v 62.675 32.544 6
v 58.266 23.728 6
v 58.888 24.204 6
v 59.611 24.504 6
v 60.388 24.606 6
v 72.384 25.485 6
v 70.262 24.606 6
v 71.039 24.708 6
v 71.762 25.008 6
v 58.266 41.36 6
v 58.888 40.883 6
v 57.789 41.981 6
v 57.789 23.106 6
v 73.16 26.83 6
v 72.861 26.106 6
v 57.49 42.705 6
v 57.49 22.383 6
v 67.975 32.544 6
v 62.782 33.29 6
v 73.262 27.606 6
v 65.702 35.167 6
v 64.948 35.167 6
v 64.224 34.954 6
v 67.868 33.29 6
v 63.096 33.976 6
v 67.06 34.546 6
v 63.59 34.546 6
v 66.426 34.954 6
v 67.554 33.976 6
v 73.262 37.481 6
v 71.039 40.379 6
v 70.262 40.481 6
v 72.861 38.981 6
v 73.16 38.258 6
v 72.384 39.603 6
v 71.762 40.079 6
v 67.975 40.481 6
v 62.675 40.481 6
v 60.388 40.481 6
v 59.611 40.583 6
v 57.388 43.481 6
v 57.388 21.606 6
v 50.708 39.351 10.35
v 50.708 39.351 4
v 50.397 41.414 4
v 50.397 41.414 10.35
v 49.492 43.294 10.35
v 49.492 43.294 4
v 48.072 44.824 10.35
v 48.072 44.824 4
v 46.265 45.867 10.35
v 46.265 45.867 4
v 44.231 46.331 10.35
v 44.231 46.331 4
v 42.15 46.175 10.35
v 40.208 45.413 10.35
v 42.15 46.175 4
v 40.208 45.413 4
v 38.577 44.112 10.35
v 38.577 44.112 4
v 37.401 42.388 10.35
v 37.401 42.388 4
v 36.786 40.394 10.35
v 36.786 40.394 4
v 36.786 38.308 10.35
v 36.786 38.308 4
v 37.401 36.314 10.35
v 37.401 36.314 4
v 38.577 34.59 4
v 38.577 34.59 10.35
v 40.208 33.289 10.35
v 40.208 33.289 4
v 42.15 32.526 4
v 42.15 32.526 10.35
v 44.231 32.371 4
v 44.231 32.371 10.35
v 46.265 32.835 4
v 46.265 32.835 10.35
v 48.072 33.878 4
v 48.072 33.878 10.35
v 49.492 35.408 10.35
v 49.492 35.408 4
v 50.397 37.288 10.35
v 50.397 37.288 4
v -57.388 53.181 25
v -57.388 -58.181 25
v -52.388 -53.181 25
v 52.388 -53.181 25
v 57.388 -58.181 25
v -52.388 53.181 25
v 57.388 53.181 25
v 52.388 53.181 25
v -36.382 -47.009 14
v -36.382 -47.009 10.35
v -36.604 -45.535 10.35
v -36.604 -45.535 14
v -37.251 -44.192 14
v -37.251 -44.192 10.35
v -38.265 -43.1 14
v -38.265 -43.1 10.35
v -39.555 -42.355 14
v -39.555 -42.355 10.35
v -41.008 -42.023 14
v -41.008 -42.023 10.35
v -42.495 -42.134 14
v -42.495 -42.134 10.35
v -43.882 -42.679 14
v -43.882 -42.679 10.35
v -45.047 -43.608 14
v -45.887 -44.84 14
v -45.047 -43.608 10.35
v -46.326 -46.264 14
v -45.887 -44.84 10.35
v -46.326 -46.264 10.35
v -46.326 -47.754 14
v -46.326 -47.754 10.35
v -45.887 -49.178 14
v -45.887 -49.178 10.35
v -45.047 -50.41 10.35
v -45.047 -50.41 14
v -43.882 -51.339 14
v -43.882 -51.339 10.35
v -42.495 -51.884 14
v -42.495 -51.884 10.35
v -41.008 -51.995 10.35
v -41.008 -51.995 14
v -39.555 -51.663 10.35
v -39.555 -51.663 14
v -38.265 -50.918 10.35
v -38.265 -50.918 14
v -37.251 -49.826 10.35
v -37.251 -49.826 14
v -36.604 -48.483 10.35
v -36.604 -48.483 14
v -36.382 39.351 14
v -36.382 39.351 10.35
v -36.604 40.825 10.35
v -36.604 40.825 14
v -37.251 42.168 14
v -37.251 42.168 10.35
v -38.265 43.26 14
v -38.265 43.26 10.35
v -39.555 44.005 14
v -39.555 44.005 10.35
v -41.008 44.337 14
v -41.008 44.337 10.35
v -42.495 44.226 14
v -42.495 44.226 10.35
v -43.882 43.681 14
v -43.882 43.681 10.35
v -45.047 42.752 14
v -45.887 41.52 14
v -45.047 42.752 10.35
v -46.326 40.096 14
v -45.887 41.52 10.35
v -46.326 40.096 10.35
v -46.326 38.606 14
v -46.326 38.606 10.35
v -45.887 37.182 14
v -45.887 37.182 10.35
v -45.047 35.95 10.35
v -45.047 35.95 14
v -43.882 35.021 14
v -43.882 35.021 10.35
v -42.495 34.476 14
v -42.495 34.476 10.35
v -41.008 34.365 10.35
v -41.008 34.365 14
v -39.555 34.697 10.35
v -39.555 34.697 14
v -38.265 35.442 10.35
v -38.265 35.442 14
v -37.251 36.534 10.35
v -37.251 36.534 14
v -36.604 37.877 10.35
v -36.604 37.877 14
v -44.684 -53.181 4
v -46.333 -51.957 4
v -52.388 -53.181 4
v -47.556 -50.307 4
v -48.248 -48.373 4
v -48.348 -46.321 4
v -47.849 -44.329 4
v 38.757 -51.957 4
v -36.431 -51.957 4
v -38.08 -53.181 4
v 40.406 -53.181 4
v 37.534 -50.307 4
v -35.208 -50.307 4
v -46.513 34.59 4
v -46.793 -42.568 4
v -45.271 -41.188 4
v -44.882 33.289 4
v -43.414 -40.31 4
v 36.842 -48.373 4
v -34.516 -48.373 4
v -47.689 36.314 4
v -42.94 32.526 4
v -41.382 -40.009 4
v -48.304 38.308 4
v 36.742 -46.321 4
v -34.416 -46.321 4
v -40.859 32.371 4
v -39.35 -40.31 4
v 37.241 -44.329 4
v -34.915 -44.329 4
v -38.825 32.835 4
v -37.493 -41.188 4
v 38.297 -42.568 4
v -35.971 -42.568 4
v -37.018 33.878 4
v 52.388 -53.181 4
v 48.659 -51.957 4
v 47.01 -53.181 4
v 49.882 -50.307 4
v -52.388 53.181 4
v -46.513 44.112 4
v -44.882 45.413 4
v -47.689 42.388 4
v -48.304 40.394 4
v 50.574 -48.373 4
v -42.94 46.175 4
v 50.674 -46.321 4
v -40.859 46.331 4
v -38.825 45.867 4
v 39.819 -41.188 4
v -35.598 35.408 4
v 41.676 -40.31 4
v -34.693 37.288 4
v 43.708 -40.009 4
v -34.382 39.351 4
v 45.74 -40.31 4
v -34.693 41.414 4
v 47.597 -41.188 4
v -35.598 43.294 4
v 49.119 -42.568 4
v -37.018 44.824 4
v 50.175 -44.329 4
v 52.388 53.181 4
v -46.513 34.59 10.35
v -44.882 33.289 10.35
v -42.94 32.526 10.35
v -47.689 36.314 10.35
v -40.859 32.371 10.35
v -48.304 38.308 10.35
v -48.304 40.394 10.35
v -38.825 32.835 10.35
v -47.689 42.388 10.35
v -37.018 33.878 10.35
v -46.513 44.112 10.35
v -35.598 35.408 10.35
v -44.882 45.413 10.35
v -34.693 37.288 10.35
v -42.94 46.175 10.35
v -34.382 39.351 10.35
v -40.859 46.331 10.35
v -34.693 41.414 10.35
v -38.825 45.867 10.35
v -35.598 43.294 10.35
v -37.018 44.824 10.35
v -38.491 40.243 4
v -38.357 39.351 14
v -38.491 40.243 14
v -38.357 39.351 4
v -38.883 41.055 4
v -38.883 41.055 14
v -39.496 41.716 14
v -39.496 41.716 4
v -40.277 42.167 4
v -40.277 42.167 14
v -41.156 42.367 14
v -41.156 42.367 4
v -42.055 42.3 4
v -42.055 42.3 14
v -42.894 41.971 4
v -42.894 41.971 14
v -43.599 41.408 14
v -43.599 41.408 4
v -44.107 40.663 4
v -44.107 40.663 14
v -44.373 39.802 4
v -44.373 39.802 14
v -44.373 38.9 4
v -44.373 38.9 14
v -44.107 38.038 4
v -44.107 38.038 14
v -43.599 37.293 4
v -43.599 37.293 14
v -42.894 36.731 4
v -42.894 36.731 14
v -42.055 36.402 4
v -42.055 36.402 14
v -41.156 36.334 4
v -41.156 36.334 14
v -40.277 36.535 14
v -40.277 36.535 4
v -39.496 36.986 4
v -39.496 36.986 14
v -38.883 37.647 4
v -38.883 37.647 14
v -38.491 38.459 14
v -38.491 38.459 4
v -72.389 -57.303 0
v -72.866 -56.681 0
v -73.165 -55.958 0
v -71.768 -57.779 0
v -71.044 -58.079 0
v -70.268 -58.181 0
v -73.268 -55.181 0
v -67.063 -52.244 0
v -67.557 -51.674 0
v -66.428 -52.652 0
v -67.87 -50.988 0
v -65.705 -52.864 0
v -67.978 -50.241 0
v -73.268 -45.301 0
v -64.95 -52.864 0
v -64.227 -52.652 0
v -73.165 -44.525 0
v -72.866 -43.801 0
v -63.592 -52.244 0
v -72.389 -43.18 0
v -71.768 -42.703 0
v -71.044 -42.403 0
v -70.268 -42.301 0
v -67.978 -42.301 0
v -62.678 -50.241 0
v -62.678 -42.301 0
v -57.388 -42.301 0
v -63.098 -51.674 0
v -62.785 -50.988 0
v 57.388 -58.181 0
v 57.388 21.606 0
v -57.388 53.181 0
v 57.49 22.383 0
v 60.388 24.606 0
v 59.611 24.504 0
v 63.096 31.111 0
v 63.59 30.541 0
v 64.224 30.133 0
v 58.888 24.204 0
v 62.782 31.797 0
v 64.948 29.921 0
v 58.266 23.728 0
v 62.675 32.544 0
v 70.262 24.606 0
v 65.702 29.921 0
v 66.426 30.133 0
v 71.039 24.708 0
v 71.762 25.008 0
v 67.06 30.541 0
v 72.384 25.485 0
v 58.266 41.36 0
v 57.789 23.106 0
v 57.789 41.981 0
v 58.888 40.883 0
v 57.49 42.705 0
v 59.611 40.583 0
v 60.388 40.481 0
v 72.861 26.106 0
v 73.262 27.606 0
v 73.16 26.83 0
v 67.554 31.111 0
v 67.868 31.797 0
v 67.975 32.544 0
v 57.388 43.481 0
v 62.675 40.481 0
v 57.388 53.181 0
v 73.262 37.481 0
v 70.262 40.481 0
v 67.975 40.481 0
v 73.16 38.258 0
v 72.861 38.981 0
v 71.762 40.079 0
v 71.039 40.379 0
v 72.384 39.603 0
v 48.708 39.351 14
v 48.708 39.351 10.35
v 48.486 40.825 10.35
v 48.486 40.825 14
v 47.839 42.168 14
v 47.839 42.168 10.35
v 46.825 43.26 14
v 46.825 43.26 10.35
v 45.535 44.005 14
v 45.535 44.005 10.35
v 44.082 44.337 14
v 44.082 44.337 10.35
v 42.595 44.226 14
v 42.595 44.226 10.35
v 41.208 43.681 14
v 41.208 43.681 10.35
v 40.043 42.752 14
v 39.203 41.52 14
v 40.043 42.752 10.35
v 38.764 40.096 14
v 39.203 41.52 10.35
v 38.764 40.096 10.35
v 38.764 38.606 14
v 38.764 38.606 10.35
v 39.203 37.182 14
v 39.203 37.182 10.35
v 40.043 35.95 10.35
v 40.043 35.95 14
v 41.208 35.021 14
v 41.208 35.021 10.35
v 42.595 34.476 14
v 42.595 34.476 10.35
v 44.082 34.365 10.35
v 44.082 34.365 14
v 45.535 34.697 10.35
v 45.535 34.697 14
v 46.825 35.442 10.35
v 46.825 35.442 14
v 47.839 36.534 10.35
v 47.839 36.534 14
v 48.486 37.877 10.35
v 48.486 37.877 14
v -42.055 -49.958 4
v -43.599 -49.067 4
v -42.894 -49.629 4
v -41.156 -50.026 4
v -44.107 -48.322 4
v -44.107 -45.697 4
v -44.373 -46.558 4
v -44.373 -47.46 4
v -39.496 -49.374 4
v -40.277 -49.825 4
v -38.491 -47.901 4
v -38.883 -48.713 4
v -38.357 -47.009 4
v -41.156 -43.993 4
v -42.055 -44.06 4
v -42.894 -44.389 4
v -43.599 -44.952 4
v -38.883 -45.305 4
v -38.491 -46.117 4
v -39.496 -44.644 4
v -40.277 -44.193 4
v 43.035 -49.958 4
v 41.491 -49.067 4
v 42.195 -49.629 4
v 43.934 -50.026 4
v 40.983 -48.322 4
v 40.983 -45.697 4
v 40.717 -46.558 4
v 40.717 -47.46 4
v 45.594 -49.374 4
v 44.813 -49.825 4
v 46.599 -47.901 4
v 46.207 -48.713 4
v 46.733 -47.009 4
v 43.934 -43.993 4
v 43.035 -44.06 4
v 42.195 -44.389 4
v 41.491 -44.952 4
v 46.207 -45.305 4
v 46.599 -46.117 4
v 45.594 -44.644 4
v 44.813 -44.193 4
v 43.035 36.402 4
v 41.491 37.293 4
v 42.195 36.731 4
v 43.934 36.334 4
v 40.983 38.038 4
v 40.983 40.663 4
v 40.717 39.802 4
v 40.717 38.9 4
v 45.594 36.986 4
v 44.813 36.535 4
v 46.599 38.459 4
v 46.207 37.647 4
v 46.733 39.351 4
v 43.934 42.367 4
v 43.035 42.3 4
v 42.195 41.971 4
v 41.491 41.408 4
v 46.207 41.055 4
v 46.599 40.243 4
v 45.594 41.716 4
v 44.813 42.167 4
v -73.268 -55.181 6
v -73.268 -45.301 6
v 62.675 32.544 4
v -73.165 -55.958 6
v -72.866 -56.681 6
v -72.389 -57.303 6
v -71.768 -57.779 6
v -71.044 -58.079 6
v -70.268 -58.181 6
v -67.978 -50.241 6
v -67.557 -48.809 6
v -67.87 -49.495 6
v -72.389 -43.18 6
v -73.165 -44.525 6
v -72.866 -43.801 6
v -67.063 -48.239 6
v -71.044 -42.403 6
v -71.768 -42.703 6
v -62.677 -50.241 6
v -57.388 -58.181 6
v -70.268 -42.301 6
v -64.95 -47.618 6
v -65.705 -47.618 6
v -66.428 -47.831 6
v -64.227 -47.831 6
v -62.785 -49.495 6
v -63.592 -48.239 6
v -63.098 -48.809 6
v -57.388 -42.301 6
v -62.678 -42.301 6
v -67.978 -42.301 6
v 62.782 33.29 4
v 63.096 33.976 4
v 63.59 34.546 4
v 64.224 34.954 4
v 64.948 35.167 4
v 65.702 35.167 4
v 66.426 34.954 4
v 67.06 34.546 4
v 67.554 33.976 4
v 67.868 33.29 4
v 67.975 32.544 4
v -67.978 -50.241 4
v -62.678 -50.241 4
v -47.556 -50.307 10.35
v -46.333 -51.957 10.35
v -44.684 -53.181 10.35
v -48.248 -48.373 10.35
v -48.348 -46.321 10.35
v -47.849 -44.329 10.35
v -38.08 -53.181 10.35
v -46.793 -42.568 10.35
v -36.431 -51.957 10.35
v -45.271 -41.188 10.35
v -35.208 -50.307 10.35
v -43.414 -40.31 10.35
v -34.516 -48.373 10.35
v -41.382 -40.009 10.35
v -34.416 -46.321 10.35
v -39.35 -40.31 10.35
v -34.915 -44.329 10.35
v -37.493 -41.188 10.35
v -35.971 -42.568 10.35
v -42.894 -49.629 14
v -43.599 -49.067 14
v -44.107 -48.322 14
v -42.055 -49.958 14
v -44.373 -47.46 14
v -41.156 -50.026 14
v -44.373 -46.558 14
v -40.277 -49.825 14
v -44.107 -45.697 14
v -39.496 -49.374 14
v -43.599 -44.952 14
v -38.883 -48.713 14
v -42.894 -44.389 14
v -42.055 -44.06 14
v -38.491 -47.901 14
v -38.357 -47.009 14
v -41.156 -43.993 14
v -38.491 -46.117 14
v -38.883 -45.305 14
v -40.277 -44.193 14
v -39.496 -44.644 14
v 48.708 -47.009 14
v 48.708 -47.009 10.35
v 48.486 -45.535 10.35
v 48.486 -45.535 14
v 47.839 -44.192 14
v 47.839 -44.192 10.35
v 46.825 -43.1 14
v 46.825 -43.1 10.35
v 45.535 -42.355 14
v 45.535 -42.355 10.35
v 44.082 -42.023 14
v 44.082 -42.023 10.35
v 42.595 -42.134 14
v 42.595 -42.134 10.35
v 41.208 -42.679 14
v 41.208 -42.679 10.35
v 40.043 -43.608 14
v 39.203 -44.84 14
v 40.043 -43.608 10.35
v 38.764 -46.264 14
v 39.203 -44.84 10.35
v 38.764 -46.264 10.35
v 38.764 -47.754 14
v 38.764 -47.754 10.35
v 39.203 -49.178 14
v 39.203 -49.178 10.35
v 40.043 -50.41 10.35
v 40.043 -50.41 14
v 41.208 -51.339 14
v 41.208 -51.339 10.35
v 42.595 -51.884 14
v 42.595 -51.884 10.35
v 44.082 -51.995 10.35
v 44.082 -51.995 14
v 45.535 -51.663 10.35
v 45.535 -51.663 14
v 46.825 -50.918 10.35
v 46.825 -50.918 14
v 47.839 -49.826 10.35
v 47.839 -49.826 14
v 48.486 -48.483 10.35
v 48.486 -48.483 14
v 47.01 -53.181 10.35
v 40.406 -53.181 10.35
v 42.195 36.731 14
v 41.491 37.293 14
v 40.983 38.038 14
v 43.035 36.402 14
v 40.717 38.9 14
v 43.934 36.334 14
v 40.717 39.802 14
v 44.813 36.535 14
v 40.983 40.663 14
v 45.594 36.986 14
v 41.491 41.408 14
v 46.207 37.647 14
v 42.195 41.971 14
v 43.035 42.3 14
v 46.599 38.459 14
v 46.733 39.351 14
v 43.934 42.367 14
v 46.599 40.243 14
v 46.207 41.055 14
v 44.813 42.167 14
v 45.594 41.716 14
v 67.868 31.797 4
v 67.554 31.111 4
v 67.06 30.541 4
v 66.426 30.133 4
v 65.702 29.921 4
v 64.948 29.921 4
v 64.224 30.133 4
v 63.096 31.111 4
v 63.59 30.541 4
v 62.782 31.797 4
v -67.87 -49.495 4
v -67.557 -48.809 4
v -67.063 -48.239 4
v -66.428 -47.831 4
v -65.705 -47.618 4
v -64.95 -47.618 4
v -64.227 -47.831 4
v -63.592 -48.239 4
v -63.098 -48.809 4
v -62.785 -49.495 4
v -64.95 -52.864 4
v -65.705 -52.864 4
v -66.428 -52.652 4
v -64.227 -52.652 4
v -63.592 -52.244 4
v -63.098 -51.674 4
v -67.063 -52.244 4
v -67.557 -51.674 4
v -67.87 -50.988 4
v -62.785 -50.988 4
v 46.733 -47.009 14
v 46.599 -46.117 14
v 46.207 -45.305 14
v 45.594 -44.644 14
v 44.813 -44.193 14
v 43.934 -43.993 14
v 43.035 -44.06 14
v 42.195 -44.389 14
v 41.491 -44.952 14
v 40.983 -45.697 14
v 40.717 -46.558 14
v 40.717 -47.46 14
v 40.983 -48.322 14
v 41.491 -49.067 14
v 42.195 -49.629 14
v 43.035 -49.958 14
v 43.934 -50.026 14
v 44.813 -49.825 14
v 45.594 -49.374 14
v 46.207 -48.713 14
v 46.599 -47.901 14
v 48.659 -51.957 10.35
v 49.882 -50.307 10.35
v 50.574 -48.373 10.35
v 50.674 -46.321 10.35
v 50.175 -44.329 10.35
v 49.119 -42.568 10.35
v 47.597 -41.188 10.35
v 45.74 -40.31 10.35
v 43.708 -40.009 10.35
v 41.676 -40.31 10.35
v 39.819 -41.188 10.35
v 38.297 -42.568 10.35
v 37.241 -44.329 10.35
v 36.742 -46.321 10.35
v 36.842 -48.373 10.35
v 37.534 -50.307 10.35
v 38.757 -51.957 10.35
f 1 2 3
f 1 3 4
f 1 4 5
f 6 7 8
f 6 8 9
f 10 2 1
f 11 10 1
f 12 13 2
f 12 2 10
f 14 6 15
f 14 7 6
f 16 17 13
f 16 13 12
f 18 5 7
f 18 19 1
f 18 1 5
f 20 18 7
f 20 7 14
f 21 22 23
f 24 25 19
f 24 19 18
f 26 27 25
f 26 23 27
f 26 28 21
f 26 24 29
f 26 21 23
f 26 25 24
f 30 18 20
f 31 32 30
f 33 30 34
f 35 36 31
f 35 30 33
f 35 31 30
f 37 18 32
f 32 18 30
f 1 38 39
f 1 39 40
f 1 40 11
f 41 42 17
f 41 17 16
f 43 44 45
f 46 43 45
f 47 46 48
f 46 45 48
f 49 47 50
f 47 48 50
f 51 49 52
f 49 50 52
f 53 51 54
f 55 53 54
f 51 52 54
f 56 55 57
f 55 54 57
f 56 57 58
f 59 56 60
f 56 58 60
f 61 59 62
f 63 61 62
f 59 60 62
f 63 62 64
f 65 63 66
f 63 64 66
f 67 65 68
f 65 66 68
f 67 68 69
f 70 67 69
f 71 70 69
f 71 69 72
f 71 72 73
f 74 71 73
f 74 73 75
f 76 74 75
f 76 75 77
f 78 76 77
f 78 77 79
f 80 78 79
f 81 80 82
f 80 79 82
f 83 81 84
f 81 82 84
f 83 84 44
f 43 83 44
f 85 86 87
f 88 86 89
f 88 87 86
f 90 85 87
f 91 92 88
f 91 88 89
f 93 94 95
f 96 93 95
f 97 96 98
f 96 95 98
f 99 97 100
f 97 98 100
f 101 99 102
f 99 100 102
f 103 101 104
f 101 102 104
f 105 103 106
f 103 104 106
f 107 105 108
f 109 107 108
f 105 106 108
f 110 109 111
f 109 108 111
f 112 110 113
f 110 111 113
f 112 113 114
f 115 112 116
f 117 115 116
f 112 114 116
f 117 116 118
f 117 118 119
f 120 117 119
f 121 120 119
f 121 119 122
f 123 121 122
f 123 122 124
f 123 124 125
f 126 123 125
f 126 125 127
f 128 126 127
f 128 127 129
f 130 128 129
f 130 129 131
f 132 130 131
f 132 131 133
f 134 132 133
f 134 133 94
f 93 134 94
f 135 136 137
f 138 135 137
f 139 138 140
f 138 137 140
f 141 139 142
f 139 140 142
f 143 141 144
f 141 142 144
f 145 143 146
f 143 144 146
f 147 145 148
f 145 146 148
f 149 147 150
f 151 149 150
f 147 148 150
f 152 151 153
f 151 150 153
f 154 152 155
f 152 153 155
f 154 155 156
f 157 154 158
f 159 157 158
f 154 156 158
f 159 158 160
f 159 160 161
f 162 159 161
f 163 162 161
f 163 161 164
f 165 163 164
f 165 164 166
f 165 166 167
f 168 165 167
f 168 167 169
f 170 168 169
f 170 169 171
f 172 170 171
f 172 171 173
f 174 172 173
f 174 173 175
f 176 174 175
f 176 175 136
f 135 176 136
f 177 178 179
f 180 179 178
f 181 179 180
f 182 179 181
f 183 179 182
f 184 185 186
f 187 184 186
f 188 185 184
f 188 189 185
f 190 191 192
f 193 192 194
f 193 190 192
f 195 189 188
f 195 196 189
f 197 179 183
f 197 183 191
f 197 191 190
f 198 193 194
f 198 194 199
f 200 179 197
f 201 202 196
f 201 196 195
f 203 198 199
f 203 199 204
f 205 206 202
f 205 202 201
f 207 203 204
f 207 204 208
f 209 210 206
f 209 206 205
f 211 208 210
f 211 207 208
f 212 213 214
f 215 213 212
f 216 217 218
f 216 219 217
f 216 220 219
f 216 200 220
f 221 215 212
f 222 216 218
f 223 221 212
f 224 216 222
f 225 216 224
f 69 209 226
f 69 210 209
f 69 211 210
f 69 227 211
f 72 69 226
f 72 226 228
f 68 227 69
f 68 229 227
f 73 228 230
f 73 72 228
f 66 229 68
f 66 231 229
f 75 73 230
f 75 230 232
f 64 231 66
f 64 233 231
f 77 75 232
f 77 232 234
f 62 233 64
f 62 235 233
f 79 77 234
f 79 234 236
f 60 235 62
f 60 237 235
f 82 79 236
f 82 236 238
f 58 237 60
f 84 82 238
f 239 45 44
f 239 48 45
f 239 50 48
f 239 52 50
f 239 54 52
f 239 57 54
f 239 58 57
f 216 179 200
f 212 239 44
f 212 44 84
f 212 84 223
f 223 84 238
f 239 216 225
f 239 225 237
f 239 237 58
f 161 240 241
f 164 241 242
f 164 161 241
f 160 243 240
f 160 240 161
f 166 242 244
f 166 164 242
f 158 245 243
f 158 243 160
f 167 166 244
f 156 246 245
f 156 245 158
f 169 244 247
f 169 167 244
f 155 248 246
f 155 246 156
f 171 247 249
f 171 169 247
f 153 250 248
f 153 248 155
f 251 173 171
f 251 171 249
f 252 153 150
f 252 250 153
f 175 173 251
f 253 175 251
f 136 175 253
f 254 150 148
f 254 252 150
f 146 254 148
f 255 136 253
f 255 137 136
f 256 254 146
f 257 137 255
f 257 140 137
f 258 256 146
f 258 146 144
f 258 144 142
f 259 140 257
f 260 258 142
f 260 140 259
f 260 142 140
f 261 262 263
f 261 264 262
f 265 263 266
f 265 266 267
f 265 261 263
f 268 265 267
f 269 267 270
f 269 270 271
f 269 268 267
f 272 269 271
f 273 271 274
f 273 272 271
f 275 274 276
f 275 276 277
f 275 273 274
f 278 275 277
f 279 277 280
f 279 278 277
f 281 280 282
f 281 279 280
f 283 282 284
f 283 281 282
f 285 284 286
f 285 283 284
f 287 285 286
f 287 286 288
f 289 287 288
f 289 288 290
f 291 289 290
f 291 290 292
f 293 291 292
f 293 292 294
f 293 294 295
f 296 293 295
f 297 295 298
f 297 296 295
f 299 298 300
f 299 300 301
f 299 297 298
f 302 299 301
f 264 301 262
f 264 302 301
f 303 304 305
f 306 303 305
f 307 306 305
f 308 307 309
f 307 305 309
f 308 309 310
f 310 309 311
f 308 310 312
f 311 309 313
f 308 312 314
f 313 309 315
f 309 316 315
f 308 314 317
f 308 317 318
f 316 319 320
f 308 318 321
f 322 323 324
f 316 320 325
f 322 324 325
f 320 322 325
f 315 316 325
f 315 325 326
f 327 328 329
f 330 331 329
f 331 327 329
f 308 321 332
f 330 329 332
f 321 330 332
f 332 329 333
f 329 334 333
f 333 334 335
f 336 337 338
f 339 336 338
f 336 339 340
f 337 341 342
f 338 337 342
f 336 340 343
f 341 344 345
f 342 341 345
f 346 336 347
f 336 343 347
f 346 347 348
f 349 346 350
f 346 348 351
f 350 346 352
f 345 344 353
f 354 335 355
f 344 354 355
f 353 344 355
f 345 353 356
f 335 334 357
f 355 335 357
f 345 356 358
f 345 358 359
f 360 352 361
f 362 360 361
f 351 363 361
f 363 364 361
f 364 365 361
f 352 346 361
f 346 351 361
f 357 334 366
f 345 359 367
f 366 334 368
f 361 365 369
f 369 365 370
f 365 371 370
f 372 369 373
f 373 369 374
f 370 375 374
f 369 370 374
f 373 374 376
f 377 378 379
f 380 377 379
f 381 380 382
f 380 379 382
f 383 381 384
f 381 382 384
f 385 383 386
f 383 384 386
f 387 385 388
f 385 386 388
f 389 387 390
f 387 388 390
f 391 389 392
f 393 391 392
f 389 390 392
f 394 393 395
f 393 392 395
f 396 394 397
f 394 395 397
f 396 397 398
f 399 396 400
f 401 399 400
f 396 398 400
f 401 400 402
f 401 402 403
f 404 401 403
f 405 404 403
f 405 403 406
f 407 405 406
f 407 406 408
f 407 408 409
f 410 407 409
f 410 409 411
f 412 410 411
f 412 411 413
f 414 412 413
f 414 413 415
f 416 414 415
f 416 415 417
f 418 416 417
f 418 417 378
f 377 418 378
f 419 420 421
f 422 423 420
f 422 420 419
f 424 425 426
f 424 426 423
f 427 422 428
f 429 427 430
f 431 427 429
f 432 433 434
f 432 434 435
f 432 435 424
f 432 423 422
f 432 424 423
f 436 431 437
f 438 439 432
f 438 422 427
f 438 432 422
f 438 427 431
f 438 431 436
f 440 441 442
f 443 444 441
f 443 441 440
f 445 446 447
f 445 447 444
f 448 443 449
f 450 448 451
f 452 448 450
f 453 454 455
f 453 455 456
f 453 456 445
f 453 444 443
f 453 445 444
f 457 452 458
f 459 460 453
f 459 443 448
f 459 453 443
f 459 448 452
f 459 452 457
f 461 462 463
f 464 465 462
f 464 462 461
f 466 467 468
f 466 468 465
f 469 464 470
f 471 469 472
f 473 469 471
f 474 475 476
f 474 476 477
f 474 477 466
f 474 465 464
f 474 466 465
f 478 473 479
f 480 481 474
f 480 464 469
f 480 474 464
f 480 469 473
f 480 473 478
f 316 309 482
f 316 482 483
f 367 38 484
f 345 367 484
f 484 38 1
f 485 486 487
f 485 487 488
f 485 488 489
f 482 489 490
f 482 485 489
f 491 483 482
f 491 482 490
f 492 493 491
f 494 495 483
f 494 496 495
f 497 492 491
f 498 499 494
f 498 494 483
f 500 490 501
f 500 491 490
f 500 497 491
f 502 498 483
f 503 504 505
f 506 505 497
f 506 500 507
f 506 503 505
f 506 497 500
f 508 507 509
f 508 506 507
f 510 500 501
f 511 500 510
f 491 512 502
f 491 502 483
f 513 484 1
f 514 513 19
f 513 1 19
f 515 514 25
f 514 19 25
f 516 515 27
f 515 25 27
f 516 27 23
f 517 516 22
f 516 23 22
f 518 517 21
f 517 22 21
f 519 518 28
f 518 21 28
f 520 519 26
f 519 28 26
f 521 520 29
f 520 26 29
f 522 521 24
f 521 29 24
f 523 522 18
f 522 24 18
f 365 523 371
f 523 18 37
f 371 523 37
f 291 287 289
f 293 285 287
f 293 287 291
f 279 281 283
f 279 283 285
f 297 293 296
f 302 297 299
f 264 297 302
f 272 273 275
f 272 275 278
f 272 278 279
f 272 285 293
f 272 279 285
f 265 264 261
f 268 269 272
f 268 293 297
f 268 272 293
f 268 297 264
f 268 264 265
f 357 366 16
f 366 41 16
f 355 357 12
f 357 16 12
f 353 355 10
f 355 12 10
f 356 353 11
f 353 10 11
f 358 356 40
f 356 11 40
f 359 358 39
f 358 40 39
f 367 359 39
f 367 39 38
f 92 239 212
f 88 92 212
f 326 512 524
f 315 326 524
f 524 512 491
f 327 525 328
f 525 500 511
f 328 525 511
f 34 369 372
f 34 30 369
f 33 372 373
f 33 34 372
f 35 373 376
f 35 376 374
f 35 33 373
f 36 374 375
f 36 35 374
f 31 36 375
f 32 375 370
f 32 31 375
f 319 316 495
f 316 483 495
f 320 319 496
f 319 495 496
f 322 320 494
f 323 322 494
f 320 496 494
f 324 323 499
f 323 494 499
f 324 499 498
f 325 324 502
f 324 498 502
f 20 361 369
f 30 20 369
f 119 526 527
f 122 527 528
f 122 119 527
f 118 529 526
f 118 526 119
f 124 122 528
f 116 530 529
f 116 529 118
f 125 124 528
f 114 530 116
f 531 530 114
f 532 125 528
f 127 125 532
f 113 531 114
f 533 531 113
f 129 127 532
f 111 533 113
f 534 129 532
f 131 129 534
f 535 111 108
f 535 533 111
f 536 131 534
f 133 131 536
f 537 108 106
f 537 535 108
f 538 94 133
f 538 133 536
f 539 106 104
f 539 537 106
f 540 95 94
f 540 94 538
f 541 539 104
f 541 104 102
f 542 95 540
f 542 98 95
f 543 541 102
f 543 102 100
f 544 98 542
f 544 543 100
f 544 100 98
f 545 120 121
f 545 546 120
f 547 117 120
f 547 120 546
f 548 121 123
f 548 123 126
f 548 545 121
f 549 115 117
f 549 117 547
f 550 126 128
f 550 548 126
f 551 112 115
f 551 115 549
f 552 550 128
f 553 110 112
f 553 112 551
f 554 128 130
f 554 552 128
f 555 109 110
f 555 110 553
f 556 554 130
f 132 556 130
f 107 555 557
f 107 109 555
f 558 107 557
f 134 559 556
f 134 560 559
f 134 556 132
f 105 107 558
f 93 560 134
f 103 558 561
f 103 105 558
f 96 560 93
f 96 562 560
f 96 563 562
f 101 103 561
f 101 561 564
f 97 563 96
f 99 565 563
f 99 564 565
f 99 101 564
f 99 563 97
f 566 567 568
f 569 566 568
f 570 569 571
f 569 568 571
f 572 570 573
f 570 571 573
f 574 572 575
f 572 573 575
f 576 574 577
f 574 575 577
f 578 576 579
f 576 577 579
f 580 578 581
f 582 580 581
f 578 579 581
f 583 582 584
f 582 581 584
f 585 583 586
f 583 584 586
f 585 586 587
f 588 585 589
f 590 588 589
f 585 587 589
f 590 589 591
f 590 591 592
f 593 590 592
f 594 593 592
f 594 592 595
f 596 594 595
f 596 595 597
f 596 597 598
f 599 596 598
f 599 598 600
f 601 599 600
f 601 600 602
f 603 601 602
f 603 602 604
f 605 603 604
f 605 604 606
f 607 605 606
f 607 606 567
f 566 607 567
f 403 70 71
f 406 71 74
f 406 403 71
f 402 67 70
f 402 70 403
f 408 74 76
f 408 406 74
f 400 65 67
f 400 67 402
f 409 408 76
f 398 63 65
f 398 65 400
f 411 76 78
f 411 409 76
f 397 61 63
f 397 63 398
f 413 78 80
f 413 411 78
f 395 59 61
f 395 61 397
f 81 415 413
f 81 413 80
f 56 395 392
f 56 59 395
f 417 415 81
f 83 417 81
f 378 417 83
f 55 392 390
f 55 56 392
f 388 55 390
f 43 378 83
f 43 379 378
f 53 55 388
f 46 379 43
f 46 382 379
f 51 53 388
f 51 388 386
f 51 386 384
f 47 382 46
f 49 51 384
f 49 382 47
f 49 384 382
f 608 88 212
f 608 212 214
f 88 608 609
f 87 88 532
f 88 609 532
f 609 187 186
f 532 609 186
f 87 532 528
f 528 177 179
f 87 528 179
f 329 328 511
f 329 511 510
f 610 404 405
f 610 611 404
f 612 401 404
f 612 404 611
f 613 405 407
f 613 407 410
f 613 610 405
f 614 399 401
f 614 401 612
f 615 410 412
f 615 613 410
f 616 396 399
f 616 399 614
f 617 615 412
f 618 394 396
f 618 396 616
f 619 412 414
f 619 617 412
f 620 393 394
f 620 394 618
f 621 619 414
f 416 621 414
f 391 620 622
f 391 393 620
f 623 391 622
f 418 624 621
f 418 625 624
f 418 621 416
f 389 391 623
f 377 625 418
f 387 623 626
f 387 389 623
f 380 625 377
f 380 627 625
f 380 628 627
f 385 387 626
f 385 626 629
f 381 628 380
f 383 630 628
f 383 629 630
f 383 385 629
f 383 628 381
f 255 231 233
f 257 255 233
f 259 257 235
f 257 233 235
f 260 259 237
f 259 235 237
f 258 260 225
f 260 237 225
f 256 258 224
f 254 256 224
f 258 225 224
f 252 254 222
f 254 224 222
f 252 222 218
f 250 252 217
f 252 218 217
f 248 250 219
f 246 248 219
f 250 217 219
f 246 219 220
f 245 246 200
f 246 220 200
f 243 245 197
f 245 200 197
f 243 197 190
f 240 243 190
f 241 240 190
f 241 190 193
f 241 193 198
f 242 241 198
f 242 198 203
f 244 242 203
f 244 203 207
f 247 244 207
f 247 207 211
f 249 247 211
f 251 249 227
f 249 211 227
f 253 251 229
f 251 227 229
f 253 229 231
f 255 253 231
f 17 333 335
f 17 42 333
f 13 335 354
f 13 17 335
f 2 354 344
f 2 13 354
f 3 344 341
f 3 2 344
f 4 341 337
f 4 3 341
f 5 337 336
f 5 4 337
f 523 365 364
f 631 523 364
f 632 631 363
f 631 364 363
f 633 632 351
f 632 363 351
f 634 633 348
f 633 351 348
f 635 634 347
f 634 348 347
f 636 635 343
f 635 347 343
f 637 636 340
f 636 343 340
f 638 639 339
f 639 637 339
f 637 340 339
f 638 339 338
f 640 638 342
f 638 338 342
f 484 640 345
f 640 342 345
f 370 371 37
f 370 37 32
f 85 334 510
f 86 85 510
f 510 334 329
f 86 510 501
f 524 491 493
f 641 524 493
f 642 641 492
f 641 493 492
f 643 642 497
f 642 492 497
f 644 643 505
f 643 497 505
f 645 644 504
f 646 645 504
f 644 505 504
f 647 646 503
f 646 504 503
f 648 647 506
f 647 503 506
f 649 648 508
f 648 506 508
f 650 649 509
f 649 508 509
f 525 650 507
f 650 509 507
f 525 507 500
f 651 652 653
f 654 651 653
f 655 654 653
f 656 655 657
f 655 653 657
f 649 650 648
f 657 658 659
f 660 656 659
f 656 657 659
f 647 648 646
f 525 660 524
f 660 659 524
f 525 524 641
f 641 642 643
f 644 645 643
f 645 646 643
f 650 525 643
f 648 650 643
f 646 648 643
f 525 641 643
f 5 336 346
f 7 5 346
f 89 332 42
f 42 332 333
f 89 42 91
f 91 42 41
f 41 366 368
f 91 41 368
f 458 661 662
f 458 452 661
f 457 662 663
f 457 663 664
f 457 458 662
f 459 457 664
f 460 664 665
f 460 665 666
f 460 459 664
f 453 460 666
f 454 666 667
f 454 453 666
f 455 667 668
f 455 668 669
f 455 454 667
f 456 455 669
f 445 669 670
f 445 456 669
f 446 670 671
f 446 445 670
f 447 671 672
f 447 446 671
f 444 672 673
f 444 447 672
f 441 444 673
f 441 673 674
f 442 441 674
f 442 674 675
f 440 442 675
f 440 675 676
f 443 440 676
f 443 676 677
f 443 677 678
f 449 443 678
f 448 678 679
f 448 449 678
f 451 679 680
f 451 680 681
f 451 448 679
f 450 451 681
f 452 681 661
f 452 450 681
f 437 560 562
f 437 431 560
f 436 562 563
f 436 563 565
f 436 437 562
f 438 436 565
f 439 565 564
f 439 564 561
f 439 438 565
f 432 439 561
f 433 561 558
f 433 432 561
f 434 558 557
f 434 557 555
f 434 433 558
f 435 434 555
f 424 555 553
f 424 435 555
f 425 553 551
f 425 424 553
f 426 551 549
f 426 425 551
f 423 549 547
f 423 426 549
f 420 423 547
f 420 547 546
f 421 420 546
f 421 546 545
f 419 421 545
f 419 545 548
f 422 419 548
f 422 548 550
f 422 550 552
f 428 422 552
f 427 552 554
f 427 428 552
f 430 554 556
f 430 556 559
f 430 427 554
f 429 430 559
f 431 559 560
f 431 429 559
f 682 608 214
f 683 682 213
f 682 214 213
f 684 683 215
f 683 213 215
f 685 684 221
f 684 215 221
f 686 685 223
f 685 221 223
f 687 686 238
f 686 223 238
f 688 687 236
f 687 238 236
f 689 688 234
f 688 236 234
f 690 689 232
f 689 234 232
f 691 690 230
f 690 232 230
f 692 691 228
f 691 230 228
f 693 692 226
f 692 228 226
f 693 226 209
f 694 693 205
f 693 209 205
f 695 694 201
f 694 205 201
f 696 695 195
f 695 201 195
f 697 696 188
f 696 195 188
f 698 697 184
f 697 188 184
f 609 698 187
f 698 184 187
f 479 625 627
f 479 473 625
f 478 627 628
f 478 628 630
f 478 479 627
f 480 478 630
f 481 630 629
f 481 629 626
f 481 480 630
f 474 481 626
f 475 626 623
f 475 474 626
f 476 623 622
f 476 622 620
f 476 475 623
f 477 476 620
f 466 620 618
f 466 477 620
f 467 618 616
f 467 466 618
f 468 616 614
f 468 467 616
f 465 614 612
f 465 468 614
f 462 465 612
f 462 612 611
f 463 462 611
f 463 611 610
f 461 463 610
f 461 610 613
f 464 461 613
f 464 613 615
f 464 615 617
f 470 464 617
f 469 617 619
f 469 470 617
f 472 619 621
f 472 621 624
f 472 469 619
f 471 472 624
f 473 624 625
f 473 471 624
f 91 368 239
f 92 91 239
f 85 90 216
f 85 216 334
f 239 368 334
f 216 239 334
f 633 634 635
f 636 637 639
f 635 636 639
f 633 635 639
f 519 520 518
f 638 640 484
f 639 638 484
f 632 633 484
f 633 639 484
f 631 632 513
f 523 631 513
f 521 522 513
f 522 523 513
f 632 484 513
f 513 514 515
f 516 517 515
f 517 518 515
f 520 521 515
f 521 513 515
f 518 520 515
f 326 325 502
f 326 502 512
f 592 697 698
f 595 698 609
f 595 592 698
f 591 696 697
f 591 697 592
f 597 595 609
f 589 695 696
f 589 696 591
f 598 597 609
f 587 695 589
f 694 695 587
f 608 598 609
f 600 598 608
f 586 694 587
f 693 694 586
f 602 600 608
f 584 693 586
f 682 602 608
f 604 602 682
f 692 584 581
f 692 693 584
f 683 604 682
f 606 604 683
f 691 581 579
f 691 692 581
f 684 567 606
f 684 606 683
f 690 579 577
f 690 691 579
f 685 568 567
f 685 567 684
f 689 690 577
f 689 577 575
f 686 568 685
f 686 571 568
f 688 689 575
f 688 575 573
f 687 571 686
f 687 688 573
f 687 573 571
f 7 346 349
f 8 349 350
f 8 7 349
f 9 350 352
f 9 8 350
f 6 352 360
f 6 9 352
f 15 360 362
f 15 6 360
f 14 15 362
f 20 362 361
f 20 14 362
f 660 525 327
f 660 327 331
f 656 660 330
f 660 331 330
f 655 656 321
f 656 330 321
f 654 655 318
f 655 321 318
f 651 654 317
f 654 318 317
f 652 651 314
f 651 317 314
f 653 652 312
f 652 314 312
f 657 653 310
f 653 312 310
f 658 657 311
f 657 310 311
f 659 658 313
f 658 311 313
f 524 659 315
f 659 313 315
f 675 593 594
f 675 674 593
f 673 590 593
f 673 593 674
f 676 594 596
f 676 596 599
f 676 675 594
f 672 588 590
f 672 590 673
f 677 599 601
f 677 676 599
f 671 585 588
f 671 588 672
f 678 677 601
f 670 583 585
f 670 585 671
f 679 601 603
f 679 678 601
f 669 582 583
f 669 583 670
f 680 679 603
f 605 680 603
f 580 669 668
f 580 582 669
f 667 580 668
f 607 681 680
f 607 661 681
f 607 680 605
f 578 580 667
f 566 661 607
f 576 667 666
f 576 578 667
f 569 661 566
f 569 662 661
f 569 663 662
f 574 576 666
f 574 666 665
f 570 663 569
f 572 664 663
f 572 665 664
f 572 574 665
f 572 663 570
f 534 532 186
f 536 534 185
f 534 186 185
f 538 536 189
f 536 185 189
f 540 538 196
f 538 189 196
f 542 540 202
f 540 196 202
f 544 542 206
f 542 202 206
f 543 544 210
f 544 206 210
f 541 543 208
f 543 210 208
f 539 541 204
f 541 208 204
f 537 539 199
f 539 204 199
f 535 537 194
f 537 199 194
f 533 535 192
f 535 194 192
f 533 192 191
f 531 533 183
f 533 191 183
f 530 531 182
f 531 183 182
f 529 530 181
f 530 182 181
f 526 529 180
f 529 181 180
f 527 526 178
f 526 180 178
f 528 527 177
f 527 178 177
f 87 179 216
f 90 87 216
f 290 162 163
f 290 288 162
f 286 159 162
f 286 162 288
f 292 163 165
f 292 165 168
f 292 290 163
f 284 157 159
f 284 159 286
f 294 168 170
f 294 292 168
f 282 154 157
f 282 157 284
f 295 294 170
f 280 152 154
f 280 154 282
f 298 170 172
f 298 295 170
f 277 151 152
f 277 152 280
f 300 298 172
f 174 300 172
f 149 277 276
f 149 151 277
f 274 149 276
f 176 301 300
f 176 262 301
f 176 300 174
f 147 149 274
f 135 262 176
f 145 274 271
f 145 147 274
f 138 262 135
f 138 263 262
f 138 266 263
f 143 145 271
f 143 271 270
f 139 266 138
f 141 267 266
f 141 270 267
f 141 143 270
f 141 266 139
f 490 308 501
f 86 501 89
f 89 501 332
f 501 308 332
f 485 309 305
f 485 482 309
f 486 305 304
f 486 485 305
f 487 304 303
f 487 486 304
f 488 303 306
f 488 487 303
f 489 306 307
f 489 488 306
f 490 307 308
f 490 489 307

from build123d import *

# Parameters (mm, degrees)
SKETCH1_W                     = 104.775
SKETCH1_H                     = 106.3625
BOSS_EXTRUDE1_DEPTH           = 4
BOSS_EXTRUDE2_DEPTH           = 25
SKETCH3_R                     = 5
SKETCH3_R_2                   = 3.025
BOSS_EXTRUDE3_DEPTH           = 10
SKETCH4_R                     = 7
SKETCH4_R_2                   = 3.025
BOSS_EXTRUDE4_DEPTH           = 6.35
SKETCH6_W                     = 15.875
SKETCH6_H                     = 15.875
SKETCH6_W_2                   = 15.88
SKETCH6_H_2                   = 15.88
BOSS_EXTRUDE5_DEPTH           = 6
SKETCH8_W                     = 2.65
SKETCH8_H                     = 4
M5_CLEARANCE_HOLE2_AT_2_COUNT = 2
M5_CLEARANCE_HOLE2_AT_2_PITCH = 154.672014215
FILLET2_R                     = 3
CUT_EXTRUDE1_DEPTH            = 96.468237691


with BuildPart() as part:
    # Sketch1 → Boss-Extrude1 (new body)
    with BuildSketch(Plane.XY):
        Rectangle(SKETCH1_W, SKETCH1_H)
    extrude(amount=BOSS_EXTRUDE1_DEPTH)

    # Sketch2 → Boss-Extrude2 (add)
    with BuildSketch(Plane.XY):
        Polygon((-57.3875, -53.18125), (-57.3875, -58.18125), (-52.3875, -58.18125), (57.3875, -58.18125), (57.3875, 53.18125), (52.3875, 53.18125), (52.3875, -53.18125), (-52.3875, -53.18125), (-52.3875, 53.18125), (-57.3875, 53.18125), align=None)
    extrude(amount=BOSS_EXTRUDE2_DEPTH)

    # Sketch3 → Boss-Extrude3 (add)
    # profile 1 of 4: a face of its own
    with BuildSketch(Plane.XY.offset(4)):
        with Locations((43.708, 39.35095)):
            Circle(SKETCH3_R)
        with Locations((43.708, 39.35095)):
            Circle(SKETCH3_R_2, mode=Mode.SUBTRACT)
    # profile 2 of 4: a face of its own
    with BuildSketch(Plane.XY.offset(4)):
        with Locations((-41.382, 39.35095)):
            Circle(SKETCH3_R)
        with Locations((-41.382, 39.35095)):
            Circle(SKETCH3_R_2, mode=Mode.SUBTRACT)
    # profile 3 of 4: a face of its own
    with BuildSketch(Plane.XY.offset(4)):
        with Locations((-41.382, -47.00905)):
            Circle(SKETCH3_R)
        with Locations((-41.382, -47.00905)):
            Circle(SKETCH3_R_2, mode=Mode.SUBTRACT)
    # profile 4 of 4: a face of its own
    with BuildSketch(Plane.XY.offset(4)):
        with Locations((43.708, -47.00905)):
            Circle(SKETCH3_R)
        with Locations((43.708, -47.00905)):
            Circle(SKETCH3_R_2, mode=Mode.SUBTRACT)
    extrude(amount=BOSS_EXTRUDE3_DEPTH)

    # Sketch4 → Boss-Extrude4 (add)
    # profile 1 of 4: a face of its own
    with BuildSketch(Plane.XY.offset(4)):
        with Locations((43.708, 39.35095)):
            Circle(SKETCH4_R)
        with Locations((43.708, 39.35095)):
            Circle(SKETCH4_R_2, mode=Mode.SUBTRACT)
    # profile 2 of 4: a face of its own
    with BuildSketch(Plane.XY.offset(4)):
        with Locations((-41.382, 39.35095)):
            Circle(SKETCH4_R)
        with Locations((-41.382, 39.35095)):
            Circle(SKETCH4_R_2, mode=Mode.SUBTRACT)
    # profile 3 of 4: a face of its own
    with BuildSketch(Plane.XY.offset(4)):
        with Locations((-41.382, -47.00905)):
            Circle(SKETCH4_R)
        with Locations((-41.382, -47.00905)):
            Circle(SKETCH4_R_2, mode=Mode.SUBTRACT)
    # profile 4 of 4: a face of its own
    with BuildSketch(Plane.XY.offset(4)):
        with Locations((43.708, -47.00905)):
            Circle(SKETCH4_R)
        with Locations((43.708, -47.00905)):
            Circle(SKETCH4_R_2, mode=Mode.SUBTRACT)
    extrude(amount=BOSS_EXTRUDE4_DEPTH)

    # Sketch6 → Boss-Extrude5 (add)
    with BuildSketch(Plane.XY):
        with Locations((65.325, 32.54375)):
            Rectangle(SKETCH6_W, SKETCH6_H)
        with Locations((-65.3275, -50.24125)):
            Rectangle(SKETCH6_W_2, SKETCH6_H_2)
    extrude(amount=BOSS_EXTRUDE5_DEPTH)

    # Sketch8 → M5 Clearance Hole2 (revolve, cut)
    with BuildSketch(Plane(origin=(65.325, 32.54375, 4), x_dir=(0, -1, 0), z_dir=(1, 0, 0))):
        with Locations((1.325, 2)):
            Rectangle(SKETCH8_W, SKETCH8_H)
    m5_clearance_hole2 = revolve(axis=Axis((65.325, 32.54375, 10.35), (0, 0, -1)), mode=Mode.SUBTRACT)

    # M5 Clearance Hole2 at 2: M5 Clearance Hole2 ×2
    with Locations(*[Vector(-0.8447067859256896, -0.5352293394528098, 0) * (i * M5_CLEARANCE_HOLE2_AT_2_PITCH) for i in range(1, M5_CLEARANCE_HOLE2_AT_2_COUNT)]):
        add(m5_clearance_hole2, mode=Mode.SUBTRACT)

    # Fillet2
    fillet2_edges = [part.edges().sort_by_distance(p)[0] for p in [
        (-73.2675, -42.30125, 3),
        (-73.2675, -58.18125, 3),
        (73.2625, 24.60625, 3),
        (73.2625, 40.48125, 3),
        (57.3875, 40.48125, 3),
        (57.3875, 24.60625, 3),
    ]]
    fillet(fillet2_edges, radius=FILLET2_R)

    # Sketch11 → Cut-Extrude1 (cut, through all)
    with BuildSketch(Plane.XY.offset(6)):
        with BuildLine():
            Line((-67.9775, -42.30125), (-67.9775, -50.24125))
            ThreePointArc((-67.9775, -50.24125), (-65.3275, -47.59125), (-62.6775, -50.24125))
            Line((-62.6775, -50.24125), (-62.6775, -42.30125))
            Line((-62.6775, -42.30125), (-67.9775, -42.30125))
        make_face()
        with BuildLine():
            Line((62.675, 40.48125), (62.675, 32.54375))
            ThreePointArc((62.675, 32.54375), (65.325, 35.19375), (67.975, 32.54375))
            Line((67.975, 32.54375), (67.975, 40.48125))
            Line((67.975, 40.48125), (62.675, 40.48125))
        make_face()
    extrude(amount=-CUT_EXTRUDE1_DEPTH, mode=Mode.SUBTRACT)


solid = part.part
